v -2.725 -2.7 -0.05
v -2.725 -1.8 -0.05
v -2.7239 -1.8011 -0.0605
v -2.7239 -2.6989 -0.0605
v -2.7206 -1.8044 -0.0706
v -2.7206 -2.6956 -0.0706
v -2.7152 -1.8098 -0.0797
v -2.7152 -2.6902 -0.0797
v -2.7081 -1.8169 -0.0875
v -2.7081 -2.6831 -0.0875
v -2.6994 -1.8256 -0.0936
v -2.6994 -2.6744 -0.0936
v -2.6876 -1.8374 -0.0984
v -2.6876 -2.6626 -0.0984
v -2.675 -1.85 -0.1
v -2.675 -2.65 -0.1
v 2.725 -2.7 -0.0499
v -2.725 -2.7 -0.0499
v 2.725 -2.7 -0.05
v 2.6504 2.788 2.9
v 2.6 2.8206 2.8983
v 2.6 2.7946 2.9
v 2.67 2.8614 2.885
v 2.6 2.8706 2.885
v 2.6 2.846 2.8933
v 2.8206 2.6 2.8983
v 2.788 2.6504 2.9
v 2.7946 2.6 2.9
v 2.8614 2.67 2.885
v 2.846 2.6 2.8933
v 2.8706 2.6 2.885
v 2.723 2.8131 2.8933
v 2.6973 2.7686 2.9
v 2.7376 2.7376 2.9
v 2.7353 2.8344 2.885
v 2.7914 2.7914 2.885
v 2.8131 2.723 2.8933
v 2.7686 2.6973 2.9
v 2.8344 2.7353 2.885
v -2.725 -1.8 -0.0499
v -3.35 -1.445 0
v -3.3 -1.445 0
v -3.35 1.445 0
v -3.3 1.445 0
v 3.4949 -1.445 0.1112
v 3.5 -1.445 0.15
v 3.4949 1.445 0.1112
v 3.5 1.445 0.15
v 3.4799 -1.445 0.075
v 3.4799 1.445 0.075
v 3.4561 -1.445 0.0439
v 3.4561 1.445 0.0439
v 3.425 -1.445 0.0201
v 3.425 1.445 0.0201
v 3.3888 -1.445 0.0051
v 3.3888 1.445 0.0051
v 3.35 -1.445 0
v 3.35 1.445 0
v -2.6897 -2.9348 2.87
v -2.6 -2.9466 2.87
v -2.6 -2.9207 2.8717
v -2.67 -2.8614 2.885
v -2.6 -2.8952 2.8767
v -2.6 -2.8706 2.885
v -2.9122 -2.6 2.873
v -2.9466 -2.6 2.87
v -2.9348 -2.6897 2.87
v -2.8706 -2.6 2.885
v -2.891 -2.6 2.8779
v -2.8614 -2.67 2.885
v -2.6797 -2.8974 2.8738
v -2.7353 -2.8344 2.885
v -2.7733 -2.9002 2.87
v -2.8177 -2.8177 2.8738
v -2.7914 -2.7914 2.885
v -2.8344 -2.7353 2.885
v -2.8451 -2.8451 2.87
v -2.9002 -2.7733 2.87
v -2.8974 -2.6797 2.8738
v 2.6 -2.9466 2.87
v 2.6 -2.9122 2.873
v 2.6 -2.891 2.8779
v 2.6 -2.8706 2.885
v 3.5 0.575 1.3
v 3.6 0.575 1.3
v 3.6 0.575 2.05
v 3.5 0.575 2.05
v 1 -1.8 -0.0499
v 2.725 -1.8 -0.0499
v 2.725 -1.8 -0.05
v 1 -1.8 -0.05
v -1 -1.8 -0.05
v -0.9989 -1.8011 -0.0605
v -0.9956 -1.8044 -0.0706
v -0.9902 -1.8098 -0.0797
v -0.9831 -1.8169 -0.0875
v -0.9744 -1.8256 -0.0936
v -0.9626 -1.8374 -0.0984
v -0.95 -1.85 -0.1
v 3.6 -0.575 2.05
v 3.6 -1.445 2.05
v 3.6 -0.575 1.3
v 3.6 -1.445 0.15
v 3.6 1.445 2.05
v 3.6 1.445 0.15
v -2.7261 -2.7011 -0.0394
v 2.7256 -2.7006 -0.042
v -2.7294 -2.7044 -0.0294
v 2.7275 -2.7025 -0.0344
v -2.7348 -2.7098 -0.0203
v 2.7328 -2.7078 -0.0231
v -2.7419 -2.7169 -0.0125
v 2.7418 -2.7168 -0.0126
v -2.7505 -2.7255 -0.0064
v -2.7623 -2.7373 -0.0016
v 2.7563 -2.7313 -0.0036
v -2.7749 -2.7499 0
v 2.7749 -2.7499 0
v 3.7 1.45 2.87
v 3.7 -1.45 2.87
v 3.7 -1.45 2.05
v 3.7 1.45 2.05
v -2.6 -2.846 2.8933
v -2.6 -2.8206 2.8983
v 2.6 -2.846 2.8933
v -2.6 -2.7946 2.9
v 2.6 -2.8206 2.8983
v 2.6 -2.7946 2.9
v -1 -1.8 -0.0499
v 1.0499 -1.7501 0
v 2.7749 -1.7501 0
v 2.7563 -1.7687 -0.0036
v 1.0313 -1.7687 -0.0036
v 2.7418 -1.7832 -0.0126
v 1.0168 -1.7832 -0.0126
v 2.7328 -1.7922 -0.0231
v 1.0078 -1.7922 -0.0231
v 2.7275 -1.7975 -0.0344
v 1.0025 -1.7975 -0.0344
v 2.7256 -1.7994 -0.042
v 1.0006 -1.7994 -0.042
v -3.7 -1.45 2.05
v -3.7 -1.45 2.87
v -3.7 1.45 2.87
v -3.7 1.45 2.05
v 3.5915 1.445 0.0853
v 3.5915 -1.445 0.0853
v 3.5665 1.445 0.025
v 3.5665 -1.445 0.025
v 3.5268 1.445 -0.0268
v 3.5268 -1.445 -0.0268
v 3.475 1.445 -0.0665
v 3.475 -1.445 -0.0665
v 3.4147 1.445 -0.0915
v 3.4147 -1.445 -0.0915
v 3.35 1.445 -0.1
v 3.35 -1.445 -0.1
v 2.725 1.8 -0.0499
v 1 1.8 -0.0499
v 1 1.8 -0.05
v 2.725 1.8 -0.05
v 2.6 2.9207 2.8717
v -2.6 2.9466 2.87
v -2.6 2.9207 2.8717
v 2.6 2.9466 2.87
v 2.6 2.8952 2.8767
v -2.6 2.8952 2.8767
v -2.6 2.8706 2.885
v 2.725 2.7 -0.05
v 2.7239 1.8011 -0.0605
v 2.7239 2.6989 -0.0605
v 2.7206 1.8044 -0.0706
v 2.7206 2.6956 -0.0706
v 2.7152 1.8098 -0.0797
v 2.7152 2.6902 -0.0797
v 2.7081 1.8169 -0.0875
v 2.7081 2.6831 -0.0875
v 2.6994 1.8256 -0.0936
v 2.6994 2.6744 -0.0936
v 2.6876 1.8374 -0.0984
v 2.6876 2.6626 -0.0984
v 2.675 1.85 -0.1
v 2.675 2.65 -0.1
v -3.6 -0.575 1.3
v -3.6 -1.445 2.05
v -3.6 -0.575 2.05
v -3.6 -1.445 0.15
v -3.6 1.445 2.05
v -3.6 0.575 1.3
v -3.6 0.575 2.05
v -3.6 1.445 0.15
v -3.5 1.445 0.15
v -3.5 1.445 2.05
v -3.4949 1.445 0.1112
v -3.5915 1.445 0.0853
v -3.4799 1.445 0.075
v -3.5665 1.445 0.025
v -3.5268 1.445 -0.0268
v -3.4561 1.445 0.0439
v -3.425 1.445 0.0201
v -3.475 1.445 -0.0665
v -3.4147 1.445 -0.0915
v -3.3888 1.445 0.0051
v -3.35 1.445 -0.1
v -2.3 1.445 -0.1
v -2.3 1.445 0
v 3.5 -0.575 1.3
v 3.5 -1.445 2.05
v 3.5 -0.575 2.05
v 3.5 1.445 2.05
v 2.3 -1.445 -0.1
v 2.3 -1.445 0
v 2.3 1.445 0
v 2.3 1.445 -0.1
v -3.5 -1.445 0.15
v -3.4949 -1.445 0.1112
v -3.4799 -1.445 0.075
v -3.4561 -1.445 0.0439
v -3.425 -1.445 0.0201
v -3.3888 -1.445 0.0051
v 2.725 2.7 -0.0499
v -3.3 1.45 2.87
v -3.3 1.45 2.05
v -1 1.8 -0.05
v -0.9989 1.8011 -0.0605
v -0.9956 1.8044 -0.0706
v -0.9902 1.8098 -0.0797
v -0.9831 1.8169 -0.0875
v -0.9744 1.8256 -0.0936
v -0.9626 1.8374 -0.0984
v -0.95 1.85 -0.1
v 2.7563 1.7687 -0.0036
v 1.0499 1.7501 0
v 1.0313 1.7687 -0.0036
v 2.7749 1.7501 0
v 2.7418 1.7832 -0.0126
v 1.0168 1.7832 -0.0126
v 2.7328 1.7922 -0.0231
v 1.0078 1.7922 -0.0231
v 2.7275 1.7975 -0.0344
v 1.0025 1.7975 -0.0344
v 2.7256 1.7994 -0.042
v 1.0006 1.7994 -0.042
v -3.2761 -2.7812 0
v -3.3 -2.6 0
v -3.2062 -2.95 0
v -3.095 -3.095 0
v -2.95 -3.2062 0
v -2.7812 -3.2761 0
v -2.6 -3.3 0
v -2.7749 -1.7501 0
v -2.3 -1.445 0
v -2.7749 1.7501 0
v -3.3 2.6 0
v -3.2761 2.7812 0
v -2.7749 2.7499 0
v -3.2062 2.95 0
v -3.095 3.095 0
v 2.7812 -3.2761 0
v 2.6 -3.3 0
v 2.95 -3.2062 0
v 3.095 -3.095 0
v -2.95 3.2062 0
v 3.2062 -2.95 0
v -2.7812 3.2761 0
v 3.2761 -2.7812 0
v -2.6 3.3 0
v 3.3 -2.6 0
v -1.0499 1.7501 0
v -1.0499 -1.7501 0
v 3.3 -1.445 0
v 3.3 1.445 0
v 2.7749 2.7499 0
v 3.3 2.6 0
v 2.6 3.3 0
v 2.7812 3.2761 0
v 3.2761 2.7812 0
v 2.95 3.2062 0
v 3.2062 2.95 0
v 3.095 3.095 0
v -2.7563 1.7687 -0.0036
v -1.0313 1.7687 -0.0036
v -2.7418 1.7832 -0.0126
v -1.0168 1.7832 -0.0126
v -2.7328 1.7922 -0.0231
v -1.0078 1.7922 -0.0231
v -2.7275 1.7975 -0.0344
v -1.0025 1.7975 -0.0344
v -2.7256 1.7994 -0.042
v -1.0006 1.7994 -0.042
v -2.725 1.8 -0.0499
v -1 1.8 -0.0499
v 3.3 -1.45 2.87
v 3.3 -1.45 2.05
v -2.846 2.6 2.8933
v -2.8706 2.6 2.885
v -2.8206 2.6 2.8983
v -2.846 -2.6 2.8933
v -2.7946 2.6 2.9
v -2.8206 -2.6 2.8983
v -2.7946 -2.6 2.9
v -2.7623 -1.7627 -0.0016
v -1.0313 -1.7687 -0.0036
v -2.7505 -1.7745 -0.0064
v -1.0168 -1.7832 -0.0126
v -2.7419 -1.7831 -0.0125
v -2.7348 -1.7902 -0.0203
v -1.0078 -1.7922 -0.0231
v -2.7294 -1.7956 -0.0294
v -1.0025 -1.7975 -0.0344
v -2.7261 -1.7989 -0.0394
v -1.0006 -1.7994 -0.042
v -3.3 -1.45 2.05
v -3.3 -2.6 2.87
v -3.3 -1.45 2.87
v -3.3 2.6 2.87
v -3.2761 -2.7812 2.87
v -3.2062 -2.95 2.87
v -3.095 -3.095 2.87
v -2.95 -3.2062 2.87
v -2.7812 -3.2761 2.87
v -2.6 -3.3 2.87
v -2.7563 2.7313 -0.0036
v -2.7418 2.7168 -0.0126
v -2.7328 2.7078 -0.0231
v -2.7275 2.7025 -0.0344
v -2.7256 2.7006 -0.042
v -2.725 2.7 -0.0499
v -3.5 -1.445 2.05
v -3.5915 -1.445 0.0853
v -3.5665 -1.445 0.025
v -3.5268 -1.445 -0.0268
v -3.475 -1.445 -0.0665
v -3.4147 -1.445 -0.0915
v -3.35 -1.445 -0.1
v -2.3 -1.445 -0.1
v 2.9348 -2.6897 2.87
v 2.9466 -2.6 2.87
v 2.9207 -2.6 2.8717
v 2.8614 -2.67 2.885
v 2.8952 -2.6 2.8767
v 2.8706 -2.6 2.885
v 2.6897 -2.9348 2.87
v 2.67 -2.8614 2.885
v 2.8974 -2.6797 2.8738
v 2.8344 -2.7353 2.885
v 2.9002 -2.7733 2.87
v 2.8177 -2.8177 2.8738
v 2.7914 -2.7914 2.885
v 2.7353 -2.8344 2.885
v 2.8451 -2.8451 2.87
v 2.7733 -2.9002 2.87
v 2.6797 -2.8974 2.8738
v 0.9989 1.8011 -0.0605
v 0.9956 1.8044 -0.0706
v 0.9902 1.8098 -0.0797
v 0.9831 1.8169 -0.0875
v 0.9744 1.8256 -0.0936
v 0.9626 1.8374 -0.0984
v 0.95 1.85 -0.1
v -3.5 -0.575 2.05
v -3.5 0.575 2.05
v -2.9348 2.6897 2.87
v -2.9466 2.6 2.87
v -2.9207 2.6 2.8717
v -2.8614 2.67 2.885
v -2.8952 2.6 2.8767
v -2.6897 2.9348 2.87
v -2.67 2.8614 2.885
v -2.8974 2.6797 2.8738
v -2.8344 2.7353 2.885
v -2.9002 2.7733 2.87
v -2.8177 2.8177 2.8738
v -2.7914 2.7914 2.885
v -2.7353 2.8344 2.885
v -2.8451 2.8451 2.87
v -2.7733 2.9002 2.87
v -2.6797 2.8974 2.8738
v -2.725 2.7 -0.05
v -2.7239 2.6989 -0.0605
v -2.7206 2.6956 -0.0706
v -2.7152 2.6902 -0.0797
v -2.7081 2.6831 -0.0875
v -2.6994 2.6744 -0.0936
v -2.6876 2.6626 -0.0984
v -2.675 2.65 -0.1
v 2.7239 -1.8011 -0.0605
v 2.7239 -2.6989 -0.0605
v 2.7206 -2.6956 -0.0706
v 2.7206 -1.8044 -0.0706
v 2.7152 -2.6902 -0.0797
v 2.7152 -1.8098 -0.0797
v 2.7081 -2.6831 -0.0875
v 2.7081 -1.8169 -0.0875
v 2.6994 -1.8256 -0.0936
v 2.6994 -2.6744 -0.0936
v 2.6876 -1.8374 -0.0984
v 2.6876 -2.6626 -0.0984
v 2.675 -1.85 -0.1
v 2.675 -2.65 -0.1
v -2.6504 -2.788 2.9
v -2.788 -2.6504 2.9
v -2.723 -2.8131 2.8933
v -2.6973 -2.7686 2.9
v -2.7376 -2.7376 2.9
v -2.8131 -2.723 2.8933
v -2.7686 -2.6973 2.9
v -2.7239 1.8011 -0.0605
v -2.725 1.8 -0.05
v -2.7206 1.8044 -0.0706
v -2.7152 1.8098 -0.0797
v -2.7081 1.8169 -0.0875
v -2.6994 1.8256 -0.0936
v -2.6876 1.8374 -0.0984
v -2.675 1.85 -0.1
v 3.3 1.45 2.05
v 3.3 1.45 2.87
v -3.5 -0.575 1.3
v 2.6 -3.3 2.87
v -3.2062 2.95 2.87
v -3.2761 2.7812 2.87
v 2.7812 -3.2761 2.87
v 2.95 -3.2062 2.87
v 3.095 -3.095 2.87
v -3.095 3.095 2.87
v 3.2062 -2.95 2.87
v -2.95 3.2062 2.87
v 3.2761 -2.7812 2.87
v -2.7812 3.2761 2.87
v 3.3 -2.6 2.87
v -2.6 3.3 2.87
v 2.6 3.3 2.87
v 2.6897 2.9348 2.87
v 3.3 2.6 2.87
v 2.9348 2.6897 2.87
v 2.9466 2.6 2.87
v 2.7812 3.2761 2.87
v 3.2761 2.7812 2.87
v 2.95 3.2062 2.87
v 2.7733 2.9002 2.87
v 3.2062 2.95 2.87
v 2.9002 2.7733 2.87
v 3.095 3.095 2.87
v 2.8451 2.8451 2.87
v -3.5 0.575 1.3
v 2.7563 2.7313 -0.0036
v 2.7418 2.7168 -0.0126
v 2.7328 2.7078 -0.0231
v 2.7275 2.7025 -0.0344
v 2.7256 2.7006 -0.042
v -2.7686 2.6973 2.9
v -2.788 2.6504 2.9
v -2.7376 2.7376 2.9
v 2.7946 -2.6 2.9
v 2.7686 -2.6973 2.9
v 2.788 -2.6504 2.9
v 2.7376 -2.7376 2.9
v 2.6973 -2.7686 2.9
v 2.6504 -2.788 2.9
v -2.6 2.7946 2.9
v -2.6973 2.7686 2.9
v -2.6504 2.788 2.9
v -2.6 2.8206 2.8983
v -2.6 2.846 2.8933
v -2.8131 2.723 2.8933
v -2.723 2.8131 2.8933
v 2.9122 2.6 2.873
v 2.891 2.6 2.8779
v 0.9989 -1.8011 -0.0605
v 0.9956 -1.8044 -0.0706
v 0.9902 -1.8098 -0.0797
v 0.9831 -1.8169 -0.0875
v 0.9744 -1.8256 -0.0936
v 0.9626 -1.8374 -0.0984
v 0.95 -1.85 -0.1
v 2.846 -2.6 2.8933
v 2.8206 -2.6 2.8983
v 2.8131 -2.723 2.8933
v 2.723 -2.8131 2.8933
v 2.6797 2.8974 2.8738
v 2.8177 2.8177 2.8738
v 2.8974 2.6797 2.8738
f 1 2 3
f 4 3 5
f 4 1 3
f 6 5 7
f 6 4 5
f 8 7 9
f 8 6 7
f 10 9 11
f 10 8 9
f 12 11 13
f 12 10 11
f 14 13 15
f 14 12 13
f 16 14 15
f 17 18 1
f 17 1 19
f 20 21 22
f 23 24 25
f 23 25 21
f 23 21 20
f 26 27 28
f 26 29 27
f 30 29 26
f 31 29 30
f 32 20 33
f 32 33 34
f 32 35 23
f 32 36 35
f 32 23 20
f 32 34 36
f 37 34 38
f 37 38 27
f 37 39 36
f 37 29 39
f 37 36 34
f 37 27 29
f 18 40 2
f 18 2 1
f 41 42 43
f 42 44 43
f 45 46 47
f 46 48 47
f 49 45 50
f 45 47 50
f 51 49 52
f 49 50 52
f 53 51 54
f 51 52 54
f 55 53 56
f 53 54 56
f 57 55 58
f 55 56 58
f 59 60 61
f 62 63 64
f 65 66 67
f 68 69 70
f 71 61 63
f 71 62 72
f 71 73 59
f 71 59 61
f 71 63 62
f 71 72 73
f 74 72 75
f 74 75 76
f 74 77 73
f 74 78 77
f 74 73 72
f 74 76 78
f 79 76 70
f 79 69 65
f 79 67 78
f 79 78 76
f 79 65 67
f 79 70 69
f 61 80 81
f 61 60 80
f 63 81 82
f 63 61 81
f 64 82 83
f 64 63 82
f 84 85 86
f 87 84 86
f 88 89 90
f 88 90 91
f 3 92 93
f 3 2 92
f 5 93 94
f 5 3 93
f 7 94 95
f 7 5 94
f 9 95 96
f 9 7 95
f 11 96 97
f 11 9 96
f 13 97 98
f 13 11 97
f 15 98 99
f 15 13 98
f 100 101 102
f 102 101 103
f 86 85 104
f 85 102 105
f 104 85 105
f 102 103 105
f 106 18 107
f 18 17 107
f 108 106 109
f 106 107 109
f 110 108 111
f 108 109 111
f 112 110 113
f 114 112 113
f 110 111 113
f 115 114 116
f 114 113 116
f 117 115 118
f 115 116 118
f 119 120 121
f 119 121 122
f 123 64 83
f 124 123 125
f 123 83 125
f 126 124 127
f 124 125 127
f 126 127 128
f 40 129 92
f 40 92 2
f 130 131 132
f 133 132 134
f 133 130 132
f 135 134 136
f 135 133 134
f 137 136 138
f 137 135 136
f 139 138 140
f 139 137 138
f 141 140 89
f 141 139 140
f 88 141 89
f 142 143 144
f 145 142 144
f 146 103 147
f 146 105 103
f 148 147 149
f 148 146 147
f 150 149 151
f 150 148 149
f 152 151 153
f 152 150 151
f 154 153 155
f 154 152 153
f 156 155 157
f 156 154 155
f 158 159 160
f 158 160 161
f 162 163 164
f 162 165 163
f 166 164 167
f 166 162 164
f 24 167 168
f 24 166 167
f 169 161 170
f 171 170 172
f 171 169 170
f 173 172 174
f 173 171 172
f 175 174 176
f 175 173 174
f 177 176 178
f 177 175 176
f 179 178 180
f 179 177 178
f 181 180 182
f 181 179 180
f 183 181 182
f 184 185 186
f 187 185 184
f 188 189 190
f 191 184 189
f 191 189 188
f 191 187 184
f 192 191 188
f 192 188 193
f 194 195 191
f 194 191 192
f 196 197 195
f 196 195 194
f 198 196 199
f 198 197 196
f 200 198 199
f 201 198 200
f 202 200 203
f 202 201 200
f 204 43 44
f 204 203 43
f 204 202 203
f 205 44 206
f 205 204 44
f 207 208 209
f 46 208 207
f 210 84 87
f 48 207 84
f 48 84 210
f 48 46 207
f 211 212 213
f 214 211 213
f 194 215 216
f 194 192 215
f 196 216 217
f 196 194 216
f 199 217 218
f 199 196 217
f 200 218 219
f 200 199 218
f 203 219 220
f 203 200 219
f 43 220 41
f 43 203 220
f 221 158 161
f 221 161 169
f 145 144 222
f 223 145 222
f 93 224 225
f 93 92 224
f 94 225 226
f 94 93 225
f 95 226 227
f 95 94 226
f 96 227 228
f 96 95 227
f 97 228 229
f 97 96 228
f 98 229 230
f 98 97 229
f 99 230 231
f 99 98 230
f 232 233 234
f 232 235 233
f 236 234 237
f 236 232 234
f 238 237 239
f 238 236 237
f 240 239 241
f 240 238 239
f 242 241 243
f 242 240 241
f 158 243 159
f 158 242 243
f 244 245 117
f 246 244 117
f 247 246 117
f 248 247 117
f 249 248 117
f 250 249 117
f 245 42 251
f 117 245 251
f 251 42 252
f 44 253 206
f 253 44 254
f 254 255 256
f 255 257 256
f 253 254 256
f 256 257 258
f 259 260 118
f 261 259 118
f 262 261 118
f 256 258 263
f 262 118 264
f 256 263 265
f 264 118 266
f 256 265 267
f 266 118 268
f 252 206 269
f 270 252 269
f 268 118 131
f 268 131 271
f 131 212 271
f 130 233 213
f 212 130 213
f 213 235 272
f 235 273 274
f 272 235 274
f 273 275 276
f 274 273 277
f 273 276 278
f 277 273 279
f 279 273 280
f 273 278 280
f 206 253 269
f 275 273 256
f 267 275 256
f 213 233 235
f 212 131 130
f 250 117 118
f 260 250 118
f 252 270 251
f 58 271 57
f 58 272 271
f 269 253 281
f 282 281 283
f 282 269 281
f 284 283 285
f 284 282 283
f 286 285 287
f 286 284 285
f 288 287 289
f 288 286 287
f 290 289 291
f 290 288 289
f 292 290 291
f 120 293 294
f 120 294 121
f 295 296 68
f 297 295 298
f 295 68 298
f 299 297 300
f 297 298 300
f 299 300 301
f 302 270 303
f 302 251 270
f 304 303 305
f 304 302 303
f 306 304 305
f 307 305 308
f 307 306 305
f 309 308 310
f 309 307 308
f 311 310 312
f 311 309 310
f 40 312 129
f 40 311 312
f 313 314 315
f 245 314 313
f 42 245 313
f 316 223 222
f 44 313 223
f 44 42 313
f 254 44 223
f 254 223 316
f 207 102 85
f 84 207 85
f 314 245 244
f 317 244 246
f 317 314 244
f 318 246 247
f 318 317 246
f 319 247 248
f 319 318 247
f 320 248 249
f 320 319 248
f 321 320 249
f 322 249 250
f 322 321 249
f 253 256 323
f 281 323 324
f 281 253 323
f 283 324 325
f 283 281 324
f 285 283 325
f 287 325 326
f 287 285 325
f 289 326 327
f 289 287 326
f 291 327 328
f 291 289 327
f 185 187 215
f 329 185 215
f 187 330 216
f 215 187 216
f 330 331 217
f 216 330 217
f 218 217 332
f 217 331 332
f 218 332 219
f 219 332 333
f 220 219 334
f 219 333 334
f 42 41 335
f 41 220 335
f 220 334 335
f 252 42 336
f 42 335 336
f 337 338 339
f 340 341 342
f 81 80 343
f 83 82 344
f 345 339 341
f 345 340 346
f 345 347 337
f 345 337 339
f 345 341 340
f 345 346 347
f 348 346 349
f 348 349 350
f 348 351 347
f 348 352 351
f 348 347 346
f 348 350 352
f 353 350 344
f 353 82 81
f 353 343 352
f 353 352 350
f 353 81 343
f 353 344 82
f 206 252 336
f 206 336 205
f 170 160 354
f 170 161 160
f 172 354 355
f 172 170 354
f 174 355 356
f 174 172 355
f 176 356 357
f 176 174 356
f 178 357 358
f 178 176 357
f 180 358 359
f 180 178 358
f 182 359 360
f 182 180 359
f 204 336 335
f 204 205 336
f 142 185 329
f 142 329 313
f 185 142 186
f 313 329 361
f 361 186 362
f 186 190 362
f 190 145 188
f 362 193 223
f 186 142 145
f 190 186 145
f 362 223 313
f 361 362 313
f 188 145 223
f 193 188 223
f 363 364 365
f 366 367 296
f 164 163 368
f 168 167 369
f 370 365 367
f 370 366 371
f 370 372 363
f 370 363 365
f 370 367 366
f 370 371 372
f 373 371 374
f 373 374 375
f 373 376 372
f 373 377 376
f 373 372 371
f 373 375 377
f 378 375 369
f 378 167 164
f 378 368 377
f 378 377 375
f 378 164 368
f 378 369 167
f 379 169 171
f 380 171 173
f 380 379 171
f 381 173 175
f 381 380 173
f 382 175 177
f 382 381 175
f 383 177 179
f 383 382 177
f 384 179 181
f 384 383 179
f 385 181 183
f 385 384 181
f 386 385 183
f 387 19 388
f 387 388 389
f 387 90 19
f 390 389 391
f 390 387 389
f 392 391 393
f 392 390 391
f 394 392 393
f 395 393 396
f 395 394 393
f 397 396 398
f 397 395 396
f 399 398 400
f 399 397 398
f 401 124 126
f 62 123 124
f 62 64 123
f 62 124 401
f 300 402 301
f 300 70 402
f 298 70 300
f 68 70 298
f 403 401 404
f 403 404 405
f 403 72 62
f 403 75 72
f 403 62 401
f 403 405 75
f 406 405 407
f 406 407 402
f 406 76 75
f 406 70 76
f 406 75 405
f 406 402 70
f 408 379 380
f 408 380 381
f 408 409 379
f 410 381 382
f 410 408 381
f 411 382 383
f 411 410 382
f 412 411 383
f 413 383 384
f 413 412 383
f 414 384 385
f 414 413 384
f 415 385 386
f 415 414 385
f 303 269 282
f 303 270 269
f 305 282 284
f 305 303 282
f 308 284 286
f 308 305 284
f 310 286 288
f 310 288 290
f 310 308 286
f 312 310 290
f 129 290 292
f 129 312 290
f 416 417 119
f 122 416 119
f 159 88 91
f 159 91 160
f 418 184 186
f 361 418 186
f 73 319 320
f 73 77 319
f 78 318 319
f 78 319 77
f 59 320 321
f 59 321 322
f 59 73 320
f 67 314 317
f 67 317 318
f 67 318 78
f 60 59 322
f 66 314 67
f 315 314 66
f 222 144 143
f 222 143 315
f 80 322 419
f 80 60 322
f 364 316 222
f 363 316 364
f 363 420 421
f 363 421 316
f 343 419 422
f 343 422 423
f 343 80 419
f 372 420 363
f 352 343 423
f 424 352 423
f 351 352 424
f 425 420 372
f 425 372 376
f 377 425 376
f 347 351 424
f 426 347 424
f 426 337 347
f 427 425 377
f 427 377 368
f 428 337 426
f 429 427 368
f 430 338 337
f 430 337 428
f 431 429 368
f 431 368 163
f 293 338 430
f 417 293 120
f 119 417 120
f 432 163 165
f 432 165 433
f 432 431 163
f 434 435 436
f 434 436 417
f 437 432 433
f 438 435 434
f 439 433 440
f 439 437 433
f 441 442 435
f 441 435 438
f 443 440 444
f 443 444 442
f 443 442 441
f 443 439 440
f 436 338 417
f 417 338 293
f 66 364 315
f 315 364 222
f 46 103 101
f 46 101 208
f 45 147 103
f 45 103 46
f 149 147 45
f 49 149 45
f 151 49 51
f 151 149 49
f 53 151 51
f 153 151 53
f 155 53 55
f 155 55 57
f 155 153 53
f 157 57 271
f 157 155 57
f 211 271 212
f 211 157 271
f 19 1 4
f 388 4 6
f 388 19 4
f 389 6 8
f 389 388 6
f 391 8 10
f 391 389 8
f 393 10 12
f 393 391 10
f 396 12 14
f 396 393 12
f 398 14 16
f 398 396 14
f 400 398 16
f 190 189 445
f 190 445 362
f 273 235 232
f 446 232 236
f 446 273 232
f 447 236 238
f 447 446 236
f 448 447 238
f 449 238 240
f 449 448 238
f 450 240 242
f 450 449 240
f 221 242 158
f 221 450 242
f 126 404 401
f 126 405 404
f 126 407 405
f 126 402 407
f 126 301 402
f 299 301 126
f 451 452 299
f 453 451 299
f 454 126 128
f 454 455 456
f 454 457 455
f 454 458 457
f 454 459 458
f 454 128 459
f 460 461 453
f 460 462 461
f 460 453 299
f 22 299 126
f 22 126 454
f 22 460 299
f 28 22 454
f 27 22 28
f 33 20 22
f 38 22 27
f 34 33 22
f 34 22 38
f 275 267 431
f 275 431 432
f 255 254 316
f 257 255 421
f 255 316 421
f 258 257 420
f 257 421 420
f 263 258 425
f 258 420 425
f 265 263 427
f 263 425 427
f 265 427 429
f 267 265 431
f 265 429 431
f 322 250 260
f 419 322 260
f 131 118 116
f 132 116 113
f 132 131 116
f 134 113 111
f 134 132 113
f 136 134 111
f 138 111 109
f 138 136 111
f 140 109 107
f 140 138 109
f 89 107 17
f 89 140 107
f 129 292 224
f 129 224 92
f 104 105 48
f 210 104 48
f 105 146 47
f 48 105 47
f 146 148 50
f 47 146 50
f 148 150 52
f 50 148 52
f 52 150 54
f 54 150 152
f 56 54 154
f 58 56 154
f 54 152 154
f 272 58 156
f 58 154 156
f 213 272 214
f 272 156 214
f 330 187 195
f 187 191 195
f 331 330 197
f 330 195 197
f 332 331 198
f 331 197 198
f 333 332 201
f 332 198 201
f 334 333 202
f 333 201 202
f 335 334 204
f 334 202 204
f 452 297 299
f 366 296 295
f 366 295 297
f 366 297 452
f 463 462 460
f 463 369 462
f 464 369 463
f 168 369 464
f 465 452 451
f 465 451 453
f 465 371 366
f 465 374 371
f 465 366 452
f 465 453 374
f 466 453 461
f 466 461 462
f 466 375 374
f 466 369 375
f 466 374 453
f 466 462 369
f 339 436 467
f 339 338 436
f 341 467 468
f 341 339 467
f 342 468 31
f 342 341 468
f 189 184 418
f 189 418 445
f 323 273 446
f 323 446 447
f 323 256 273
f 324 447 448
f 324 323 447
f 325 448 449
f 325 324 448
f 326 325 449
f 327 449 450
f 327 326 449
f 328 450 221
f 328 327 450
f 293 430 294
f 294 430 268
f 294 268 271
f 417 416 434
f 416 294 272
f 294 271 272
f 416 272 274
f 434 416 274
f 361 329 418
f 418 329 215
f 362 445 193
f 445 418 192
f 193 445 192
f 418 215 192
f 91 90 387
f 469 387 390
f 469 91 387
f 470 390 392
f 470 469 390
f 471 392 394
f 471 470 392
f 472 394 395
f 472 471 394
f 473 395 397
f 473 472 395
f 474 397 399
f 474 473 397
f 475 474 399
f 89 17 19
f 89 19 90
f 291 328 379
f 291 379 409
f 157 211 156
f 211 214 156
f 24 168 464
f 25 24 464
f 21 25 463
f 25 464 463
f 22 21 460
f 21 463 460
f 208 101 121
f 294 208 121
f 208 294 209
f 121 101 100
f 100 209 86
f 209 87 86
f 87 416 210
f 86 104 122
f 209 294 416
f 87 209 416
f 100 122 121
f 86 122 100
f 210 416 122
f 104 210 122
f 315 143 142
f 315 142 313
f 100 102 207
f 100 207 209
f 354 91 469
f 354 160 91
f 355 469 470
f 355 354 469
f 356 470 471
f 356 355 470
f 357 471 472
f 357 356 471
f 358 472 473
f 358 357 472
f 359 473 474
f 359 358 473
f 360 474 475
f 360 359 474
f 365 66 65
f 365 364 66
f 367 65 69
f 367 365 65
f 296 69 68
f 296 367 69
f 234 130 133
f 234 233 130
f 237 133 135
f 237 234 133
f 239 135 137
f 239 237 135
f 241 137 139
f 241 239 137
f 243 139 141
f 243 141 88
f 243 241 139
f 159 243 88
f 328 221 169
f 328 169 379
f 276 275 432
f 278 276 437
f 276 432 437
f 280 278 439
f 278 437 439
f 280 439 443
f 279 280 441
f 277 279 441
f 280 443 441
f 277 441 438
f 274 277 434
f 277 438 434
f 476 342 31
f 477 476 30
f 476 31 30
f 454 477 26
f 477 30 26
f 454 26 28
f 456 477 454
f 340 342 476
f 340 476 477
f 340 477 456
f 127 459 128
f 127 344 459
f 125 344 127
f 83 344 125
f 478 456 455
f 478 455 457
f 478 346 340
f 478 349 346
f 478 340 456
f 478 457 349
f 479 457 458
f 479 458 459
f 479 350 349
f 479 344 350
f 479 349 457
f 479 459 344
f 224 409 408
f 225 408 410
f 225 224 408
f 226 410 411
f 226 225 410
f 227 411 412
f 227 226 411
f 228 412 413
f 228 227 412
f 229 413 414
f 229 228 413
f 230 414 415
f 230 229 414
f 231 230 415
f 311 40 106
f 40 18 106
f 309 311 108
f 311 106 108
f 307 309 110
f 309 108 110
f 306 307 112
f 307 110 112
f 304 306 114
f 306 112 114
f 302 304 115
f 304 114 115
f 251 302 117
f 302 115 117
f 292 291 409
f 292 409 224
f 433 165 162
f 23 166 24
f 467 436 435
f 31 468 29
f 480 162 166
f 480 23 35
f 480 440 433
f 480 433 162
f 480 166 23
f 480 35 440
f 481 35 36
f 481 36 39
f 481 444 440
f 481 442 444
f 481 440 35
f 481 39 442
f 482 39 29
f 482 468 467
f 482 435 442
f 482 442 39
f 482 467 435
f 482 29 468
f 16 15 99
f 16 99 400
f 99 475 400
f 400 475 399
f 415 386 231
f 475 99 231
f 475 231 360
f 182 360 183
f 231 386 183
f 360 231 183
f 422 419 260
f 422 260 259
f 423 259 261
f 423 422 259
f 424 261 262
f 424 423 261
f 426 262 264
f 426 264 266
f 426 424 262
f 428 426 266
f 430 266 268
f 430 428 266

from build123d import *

# Parameters (mm, degrees)
SKETCH1_W            = 6.6
SKETCH1_H            = 6.6
BOSS_EXTRUDE1_DEPTH  = 2.9
SKETCH6_W            = 7.4
SKETCH6_H            = 2.9
BOSS_EXTRUDE5_DEPTH  = 0.85
FILLET1_R            = 0.7
SKETCH2_W            = 0.9
SKETCH2_H            = 2.1
CUT_EXTRUDE1_DEPTH   = 0.05
SKETCH3_W            = 1.3
SKETCH3_H            = 2.89
BOSS_EXTRUDE2_DEPTH  = 0.15
SKETCH4_W            = 0.3
SKETCH4_H            = 2.89
BOSS_EXTRUDE3_DEPTH  = 2
FILLET2_R            = 0.25
BOSS_EXTRUDE4_DEPTH  = 0.1
FILLET3_R            = 0.05
FILLET4_R            = 0.05
SKETCH8_W            = 0.2
SKETCH8_H            = 2.89
CUT_EXTRUDE2_DEPTH   = 2.05
FILLET5_R            = 0.15
SKETCH9_W            = 0.75
SKETCH9_H            = 1.15
CUT_EXTRUDE3_DEPTH   = 0.1
FILLET2_OF_MIRROR2_R = 0.25
FILLET5_OF_MIRROR2_R = 0.15
SKETCH10_W           = 10
SKETCH10_H           = 10
CUT_EXTRUDE4_DEPTH   = 0.03
FILLET6_R            = 0.2
FILLET7_R            = 0.2


# Some blends are built 0.0001 mm under size
with BuildPart() as part:
    # Sketch1 → Boss-Extrude1 (new body)
    with BuildSketch(Plane.XY):
        Rectangle(SKETCH1_W, SKETCH1_H)
    extrude(amount=BOSS_EXTRUDE1_DEPTH)

    # Sketch6 → Boss-Extrude5 (add)
    with BuildSketch(Plane.XY.offset(2.9)):
        Rectangle(SKETCH6_W, SKETCH6_H)
    extrude(amount=-BOSS_EXTRUDE5_DEPTH)

    # Fillet1
    fillet1_edges = [part.edges().sort_by_distance(p)[0] for p in [
        (3.3, -3.3, 1.45),
        (-3.3, -3.3, 1.45),
        (-3.3, 3.3, 1.45),
        (3.3, 3.3, 1.45),
    ]]
    fillet(fillet1_edges, radius=FILLET1_R)

    # Sketch2 → Cut-Extrude1 (cut)
    with BuildSketch(Plane(origin=(0, 0, 0), x_dir=(-1, 0, 0), z_dir=(0, 0, -1))):
        with Locations((2.85, 0)):
            Rectangle(SKETCH2_W, SKETCH2_H)
        with Locations((-2.85, 0)):
            Rectangle(SKETCH2_W, SKETCH2_H)
    extrude(amount=-CUT_EXTRUDE1_DEPTH, mode=Mode.SUBTRACT)

    # Sketch3 → Boss-Extrude2 (add)
    with BuildSketch(Plane(origin=(0, 0, 0.05), x_dir=(-1, 0, 0), z_dir=(0, 0, -1))):
        with Locations((2.95, 0)):
            Rectangle(SKETCH3_W, SKETCH3_H)
    boss_extrude2 = extrude(amount=BOSS_EXTRUDE2_DEPTH)

    # Sketch4 → Boss-Extrude3 (add)
    with BuildSketch(Plane.XY.offset(0.05)):
        with Locations((-3.45, 0)):
            Rectangle(SKETCH4_W, SKETCH4_H)
    boss_extrude3 = extrude(amount=BOSS_EXTRUDE3_DEPTH)

    # Fillet2
    fillet2_edges = [part.edges().sort_by_distance(p)[0] for p in [
        (-3.6, 0, -0.1),
    ]]
    fillet(fillet2_edges, radius=FILLET2_R)

    # Sketch5 → Boss-Extrude4 (add)
    with BuildSketch(Plane(origin=(0, 0, 0), x_dir=(-1, 0, 0), z_dir=(0, 0, -1))):
        Polygon((2.725, -2.7), (-2.725, -2.7), (-2.725, -1.8), (-1, -1.8), (-1, 1.8), (-2.725, 1.8), (-2.725, 2.7), (2.725, 2.7), (2.725, 1.8), (1, 1.8), (1, -1.8), (2.725, -1.8), align=None)
    extrude(amount=BOSS_EXTRUDE4_DEPTH)

    # Fillet3
    fillet3_edges = [part.edges().sort_by_distance(p)[0] for p in [
        (-2.725, -2.25, -0.1),
        (-1.8625, -1.8, -0.1),
        (-1, 0, -0.1),
        (-1.8625, 1.8, -0.1),
        (-2.725, 2.25, -0.1),
        (0, 2.7, -0.1),
        (2.725, 2.25, -0.1),
        (1.8625, 1.8, -0.1),
        (1, 0, -0.1),
        (1.8625, -1.8, -0.1),
        (2.725, -2.25, -0.1),
        (0, -2.7, -0.1),
    ]]
    fillet(fillet3_edges, radius=FILLET3_R)

    # Fillet4
    fillet4_edges = [part.edges().sort_by_distance(p)[0] for p in [
        (-1.8625, 1.8, 0),
        (-2.725, 2.25, 0),
        (0, 2.7, 0),
        (2.725, 2.25, 0),
        (1.8625, 1.8, 0),
        (1, 0, 0),
        (1.8625, -1.8, 0),
        (2.725, -2.25, 0),
        (0, -2.7, 0),
        (-1, 0, 0),
        (-2.725, -2.25, 0),
        (-1.8625, -1.8, 0),
    ]]
    fillet(fillet4_edges, radius=FILLET4_R - 0.0001)  # a hair under: the kernel refuses the full size

    # Sketch8 → Cut-Extrude2 (cut)
    with BuildSketch(Plane(origin=(0, 0, 0), x_dir=(-1, 0, 0), z_dir=(0, 0, -1))):
        with Locations((3.4, 0)):
            Rectangle(SKETCH8_W, SKETCH8_H)
    cut_extrude2 = extrude(amount=-CUT_EXTRUDE2_DEPTH, mode=Mode.SUBTRACT)

    # Fillet5
    fillet5_edges = [part.edges().sort_by_distance(p)[0] for p in [
        (-3.5, 0, 0),
    ]]
    fillet(fillet5_edges, radius=FILLET5_R)

    # Sketch9 → Cut-Extrude3 (cut)
    with BuildSketch(Plane.ZY.offset(3.6)):
        with Locations((1.675, 0)):
            Rectangle(SKETCH9_W, SKETCH9_H)
    cut_extrude3 = extrude(amount=-CUT_EXTRUDE3_DEPTH, mode=Mode.SUBTRACT)

    # Mirror2: Boss-Extrude2, Boss-Extrude3, Cut-Extrude2, Cut-Extrude3 across plane
    add(boss_extrude2.mirror(Plane(origin=(0, 0, 0), x_dir=(0, 0, 1), z_dir=(1, 0, 0))))
    add(boss_extrude3.mirror(Plane(origin=(0, 0, 0), x_dir=(0, 0, 1), z_dir=(1, 0, 0))))
    add(cut_extrude2.mirror(Plane(origin=(0, 0, 0), x_dir=(0, 0, 1), z_dir=(1, 0, 0))), mode=Mode.SUBTRACT)
    add(cut_extrude3.mirror(Plane(origin=(0, 0, 0), x_dir=(0, 0, 1), z_dir=(1, 0, 0))), mode=Mode.SUBTRACT)

    # Fillet2 of Mirror2
    fillet2_of_mirror2_edges = [part.edges().sort_by_distance(p)[0] for p in [
        (3.6, 0, -0.1),
    ]]
    fillet(fillet2_of_mirror2_edges, radius=FILLET2_OF_MIRROR2_R)

    # Fillet5 of Mirror2
    fillet5_of_mirror2_edges = [part.edges().sort_by_distance(p)[0] for p in [
        (3.5, 0, 0),
    ]]
    fillet(fillet5_of_mirror2_edges, radius=FILLET5_OF_MIRROR2_R)

    # Sketch10 → Cut-Extrude4 (cut)
    with BuildSketch(Plane.XY.offset(2.9)):
        with Locations((0.5029938, 0.413168945)):
            Rectangle(SKETCH10_W, SKETCH10_H)
        with BuildLine():
            Line((-2.6, 2.9), (2.6, 2.9))
            ThreePointArc((2.6, 2.9), (2.812132034, 2.812132034), (2.9, 2.6))
            Line((2.9, 2.6), (2.9, -2.6))
            ThreePointArc((2.9, -2.6), (2.812132034, -2.812132034), (2.6, -2.9))
            Line((2.6, -2.9), (-2.6, -2.9))
            ThreePointArc((-2.6, -2.9), (-2.812132034, -2.812132034), (-2.9, -2.6))
            Line((-2.9, -2.6), (-2.9, 2.6))
            ThreePointArc((-2.9, 2.6), (-2.812132034, 2.812132034), (-2.6, 2.9))
        make_face(mode=Mode.SUBTRACT)
    extrude(amount=-CUT_EXTRUDE4_DEPTH, mode=Mode.SUBTRACT)

    # Fillet6
    # the kernel refuses this fillet: 0.2 mm, written as the material it takes off along each edge
    with BuildSketch(Plane(origin=(-2.6, -2.6, 2.9), x_dir=(0, -1, 0), z_dir=(1, 0, 0))) as fillet6_piece_1:
        with BuildLine():
            CenterArc((0.194643462, 0.2), FILLET6_R, 270, 31.788330618)
            Line((0.194643462, 0), (0.194643462, -0.004))
            Line((0.194643462, -0.004), (0.3, -0.004))
            Line((0.3, -0.004), (0.304, 0))
            ThreePointArc((0.304, 0), (0.304, 0.015), (0.302107131, 0.0266))
            Line((0.302107131, 0.0266), (0.3, 0.03))
        make_face()
    revolve(axis=Axis((-2.6, -2.6, 2.9), (0, 0, -1)), revolution_arc=90, mode=Mode.SUBTRACT)
    with BuildSketch(Plane(origin=(-2.9, -2.6, 2.9), x_dir=(1.837049031358635e-11, 0, -1.0), z_dir=(0, 1, 0)), Plane(origin=(-2.6, 2.9, 2.9), x_dir=(0, -1.837049031358635e-11, -1.0), z_dir=(1, 0, 0)), Plane(origin=(2.9, 2.6, 2.9), x_dir=(-1.837049031358635e-11, 0, -1.0), z_dir=(0, -1, 0)), Plane(origin=(2.6, -2.9, 2.9), x_dir=(0, 1.837049031358635e-11, -1.0), z_dir=(-1, 0, 0))) as fillet6_piece_2:
        with BuildLine():
            CenterArc((0.2, -0.105356538), FILLET6_R, 148.211669384, 31.788330618)
            Line((0, -0.105356538), (-0.004, -0.105356538))
            Line((-0.004, -0.105356538), (-0.004, 0))
            Line((-0.004, 0), (0, 0.004))
            ThreePointArc((0, 0.004), (0.015, 0.004), (0.0266, 0.002107131))
            Line((0.0266, 0.002107131), (0.03, 0))
        make_face()
    extrude(amount=5.2, mode=Mode.SUBTRACT)
    with BuildSketch(Plane(origin=(-2.6, 2.6, 2.9), x_dir=(-1, 0, 0), z_dir=(0, -1, 0))) as fillet6_piece_3:
        with BuildLine():
            CenterArc((0.194643462, 0.2), FILLET6_R, 270, 31.788330618)
            Line((0.194643462, 0), (0.194643462, -0.004))
            Line((0.194643462, -0.004), (0.3, -0.004))
            Line((0.3, -0.004), (0.304, 0))
            ThreePointArc((0.304, 0), (0.304, 0.015), (0.302107131, 0.0266))
            Line((0.302107131, 0.0266), (0.3, 0.03))
        make_face()
    revolve(axis=Axis((-2.6, 2.6, 2.9), (0, 0, -1)), revolution_arc=90, mode=Mode.SUBTRACT)
    with BuildSketch(Plane(origin=(2.6, 2.6, 2.9), x_dir=(0, 1, 0), z_dir=(-1, 0, 0))) as fillet6_piece_4:
        with BuildLine():
            CenterArc((0.194643462, 0.2), FILLET6_R, 270, 31.788330618)
            Line((0.194643462, 0), (0.194643462, -0.004))
            Line((0.194643462, -0.004), (0.3, -0.004))
            Line((0.3, -0.004), (0.304, 0))
            ThreePointArc((0.304, 0), (0.304, 0.015), (0.302107131, 0.0266))
            Line((0.302107131, 0.0266), (0.3, 0.03))
        make_face()
    revolve(axis=Axis((2.6, 2.6, 2.9), (0, 0, -1)), revolution_arc=90, mode=Mode.SUBTRACT)
    with BuildSketch(Plane(origin=(2.6, -2.6, 2.9), x_dir=(1, 0, 0), z_dir=(0, 1, 0))) as fillet6_piece_5:
        with BuildLine():
            CenterArc((0.194643462, 0.2), FILLET6_R, 270, 31.788330618)
            Line((0.194643462, 0), (0.194643462, -0.004))
            Line((0.194643462, -0.004), (0.3, -0.004))
            Line((0.3, -0.004), (0.304, 0))
            ThreePointArc((0.304, 0), (0.304, 0.015), (0.302107131, 0.0266))
            Line((0.302107131, 0.0266), (0.3, 0.03))
        make_face()
    revolve(axis=Axis((2.6, -2.6, 2.9), (0, 0, -1)), revolution_arc=90, mode=Mode.SUBTRACT)

    # Fillet7
    fillet7_edges = [part.edges().sort_by_distance(p)[0] for p in [
        (0, 2.9, 2.87),
        (-2.812132034, 2.812132034, 2.87),
        (-2.9, 0, 2.87),
        (-2.812132034, -2.812132034, 2.87),
        (0, -2.9, 2.87),
        (2.812132034, -2.812132034, 2.87),
        (2.9, 0, 2.87),
        (2.812132034, 2.812132034, 2.87),
    ]]
    fillet(fillet7_edges, radius=FILLET7_R)


solid = part.part
